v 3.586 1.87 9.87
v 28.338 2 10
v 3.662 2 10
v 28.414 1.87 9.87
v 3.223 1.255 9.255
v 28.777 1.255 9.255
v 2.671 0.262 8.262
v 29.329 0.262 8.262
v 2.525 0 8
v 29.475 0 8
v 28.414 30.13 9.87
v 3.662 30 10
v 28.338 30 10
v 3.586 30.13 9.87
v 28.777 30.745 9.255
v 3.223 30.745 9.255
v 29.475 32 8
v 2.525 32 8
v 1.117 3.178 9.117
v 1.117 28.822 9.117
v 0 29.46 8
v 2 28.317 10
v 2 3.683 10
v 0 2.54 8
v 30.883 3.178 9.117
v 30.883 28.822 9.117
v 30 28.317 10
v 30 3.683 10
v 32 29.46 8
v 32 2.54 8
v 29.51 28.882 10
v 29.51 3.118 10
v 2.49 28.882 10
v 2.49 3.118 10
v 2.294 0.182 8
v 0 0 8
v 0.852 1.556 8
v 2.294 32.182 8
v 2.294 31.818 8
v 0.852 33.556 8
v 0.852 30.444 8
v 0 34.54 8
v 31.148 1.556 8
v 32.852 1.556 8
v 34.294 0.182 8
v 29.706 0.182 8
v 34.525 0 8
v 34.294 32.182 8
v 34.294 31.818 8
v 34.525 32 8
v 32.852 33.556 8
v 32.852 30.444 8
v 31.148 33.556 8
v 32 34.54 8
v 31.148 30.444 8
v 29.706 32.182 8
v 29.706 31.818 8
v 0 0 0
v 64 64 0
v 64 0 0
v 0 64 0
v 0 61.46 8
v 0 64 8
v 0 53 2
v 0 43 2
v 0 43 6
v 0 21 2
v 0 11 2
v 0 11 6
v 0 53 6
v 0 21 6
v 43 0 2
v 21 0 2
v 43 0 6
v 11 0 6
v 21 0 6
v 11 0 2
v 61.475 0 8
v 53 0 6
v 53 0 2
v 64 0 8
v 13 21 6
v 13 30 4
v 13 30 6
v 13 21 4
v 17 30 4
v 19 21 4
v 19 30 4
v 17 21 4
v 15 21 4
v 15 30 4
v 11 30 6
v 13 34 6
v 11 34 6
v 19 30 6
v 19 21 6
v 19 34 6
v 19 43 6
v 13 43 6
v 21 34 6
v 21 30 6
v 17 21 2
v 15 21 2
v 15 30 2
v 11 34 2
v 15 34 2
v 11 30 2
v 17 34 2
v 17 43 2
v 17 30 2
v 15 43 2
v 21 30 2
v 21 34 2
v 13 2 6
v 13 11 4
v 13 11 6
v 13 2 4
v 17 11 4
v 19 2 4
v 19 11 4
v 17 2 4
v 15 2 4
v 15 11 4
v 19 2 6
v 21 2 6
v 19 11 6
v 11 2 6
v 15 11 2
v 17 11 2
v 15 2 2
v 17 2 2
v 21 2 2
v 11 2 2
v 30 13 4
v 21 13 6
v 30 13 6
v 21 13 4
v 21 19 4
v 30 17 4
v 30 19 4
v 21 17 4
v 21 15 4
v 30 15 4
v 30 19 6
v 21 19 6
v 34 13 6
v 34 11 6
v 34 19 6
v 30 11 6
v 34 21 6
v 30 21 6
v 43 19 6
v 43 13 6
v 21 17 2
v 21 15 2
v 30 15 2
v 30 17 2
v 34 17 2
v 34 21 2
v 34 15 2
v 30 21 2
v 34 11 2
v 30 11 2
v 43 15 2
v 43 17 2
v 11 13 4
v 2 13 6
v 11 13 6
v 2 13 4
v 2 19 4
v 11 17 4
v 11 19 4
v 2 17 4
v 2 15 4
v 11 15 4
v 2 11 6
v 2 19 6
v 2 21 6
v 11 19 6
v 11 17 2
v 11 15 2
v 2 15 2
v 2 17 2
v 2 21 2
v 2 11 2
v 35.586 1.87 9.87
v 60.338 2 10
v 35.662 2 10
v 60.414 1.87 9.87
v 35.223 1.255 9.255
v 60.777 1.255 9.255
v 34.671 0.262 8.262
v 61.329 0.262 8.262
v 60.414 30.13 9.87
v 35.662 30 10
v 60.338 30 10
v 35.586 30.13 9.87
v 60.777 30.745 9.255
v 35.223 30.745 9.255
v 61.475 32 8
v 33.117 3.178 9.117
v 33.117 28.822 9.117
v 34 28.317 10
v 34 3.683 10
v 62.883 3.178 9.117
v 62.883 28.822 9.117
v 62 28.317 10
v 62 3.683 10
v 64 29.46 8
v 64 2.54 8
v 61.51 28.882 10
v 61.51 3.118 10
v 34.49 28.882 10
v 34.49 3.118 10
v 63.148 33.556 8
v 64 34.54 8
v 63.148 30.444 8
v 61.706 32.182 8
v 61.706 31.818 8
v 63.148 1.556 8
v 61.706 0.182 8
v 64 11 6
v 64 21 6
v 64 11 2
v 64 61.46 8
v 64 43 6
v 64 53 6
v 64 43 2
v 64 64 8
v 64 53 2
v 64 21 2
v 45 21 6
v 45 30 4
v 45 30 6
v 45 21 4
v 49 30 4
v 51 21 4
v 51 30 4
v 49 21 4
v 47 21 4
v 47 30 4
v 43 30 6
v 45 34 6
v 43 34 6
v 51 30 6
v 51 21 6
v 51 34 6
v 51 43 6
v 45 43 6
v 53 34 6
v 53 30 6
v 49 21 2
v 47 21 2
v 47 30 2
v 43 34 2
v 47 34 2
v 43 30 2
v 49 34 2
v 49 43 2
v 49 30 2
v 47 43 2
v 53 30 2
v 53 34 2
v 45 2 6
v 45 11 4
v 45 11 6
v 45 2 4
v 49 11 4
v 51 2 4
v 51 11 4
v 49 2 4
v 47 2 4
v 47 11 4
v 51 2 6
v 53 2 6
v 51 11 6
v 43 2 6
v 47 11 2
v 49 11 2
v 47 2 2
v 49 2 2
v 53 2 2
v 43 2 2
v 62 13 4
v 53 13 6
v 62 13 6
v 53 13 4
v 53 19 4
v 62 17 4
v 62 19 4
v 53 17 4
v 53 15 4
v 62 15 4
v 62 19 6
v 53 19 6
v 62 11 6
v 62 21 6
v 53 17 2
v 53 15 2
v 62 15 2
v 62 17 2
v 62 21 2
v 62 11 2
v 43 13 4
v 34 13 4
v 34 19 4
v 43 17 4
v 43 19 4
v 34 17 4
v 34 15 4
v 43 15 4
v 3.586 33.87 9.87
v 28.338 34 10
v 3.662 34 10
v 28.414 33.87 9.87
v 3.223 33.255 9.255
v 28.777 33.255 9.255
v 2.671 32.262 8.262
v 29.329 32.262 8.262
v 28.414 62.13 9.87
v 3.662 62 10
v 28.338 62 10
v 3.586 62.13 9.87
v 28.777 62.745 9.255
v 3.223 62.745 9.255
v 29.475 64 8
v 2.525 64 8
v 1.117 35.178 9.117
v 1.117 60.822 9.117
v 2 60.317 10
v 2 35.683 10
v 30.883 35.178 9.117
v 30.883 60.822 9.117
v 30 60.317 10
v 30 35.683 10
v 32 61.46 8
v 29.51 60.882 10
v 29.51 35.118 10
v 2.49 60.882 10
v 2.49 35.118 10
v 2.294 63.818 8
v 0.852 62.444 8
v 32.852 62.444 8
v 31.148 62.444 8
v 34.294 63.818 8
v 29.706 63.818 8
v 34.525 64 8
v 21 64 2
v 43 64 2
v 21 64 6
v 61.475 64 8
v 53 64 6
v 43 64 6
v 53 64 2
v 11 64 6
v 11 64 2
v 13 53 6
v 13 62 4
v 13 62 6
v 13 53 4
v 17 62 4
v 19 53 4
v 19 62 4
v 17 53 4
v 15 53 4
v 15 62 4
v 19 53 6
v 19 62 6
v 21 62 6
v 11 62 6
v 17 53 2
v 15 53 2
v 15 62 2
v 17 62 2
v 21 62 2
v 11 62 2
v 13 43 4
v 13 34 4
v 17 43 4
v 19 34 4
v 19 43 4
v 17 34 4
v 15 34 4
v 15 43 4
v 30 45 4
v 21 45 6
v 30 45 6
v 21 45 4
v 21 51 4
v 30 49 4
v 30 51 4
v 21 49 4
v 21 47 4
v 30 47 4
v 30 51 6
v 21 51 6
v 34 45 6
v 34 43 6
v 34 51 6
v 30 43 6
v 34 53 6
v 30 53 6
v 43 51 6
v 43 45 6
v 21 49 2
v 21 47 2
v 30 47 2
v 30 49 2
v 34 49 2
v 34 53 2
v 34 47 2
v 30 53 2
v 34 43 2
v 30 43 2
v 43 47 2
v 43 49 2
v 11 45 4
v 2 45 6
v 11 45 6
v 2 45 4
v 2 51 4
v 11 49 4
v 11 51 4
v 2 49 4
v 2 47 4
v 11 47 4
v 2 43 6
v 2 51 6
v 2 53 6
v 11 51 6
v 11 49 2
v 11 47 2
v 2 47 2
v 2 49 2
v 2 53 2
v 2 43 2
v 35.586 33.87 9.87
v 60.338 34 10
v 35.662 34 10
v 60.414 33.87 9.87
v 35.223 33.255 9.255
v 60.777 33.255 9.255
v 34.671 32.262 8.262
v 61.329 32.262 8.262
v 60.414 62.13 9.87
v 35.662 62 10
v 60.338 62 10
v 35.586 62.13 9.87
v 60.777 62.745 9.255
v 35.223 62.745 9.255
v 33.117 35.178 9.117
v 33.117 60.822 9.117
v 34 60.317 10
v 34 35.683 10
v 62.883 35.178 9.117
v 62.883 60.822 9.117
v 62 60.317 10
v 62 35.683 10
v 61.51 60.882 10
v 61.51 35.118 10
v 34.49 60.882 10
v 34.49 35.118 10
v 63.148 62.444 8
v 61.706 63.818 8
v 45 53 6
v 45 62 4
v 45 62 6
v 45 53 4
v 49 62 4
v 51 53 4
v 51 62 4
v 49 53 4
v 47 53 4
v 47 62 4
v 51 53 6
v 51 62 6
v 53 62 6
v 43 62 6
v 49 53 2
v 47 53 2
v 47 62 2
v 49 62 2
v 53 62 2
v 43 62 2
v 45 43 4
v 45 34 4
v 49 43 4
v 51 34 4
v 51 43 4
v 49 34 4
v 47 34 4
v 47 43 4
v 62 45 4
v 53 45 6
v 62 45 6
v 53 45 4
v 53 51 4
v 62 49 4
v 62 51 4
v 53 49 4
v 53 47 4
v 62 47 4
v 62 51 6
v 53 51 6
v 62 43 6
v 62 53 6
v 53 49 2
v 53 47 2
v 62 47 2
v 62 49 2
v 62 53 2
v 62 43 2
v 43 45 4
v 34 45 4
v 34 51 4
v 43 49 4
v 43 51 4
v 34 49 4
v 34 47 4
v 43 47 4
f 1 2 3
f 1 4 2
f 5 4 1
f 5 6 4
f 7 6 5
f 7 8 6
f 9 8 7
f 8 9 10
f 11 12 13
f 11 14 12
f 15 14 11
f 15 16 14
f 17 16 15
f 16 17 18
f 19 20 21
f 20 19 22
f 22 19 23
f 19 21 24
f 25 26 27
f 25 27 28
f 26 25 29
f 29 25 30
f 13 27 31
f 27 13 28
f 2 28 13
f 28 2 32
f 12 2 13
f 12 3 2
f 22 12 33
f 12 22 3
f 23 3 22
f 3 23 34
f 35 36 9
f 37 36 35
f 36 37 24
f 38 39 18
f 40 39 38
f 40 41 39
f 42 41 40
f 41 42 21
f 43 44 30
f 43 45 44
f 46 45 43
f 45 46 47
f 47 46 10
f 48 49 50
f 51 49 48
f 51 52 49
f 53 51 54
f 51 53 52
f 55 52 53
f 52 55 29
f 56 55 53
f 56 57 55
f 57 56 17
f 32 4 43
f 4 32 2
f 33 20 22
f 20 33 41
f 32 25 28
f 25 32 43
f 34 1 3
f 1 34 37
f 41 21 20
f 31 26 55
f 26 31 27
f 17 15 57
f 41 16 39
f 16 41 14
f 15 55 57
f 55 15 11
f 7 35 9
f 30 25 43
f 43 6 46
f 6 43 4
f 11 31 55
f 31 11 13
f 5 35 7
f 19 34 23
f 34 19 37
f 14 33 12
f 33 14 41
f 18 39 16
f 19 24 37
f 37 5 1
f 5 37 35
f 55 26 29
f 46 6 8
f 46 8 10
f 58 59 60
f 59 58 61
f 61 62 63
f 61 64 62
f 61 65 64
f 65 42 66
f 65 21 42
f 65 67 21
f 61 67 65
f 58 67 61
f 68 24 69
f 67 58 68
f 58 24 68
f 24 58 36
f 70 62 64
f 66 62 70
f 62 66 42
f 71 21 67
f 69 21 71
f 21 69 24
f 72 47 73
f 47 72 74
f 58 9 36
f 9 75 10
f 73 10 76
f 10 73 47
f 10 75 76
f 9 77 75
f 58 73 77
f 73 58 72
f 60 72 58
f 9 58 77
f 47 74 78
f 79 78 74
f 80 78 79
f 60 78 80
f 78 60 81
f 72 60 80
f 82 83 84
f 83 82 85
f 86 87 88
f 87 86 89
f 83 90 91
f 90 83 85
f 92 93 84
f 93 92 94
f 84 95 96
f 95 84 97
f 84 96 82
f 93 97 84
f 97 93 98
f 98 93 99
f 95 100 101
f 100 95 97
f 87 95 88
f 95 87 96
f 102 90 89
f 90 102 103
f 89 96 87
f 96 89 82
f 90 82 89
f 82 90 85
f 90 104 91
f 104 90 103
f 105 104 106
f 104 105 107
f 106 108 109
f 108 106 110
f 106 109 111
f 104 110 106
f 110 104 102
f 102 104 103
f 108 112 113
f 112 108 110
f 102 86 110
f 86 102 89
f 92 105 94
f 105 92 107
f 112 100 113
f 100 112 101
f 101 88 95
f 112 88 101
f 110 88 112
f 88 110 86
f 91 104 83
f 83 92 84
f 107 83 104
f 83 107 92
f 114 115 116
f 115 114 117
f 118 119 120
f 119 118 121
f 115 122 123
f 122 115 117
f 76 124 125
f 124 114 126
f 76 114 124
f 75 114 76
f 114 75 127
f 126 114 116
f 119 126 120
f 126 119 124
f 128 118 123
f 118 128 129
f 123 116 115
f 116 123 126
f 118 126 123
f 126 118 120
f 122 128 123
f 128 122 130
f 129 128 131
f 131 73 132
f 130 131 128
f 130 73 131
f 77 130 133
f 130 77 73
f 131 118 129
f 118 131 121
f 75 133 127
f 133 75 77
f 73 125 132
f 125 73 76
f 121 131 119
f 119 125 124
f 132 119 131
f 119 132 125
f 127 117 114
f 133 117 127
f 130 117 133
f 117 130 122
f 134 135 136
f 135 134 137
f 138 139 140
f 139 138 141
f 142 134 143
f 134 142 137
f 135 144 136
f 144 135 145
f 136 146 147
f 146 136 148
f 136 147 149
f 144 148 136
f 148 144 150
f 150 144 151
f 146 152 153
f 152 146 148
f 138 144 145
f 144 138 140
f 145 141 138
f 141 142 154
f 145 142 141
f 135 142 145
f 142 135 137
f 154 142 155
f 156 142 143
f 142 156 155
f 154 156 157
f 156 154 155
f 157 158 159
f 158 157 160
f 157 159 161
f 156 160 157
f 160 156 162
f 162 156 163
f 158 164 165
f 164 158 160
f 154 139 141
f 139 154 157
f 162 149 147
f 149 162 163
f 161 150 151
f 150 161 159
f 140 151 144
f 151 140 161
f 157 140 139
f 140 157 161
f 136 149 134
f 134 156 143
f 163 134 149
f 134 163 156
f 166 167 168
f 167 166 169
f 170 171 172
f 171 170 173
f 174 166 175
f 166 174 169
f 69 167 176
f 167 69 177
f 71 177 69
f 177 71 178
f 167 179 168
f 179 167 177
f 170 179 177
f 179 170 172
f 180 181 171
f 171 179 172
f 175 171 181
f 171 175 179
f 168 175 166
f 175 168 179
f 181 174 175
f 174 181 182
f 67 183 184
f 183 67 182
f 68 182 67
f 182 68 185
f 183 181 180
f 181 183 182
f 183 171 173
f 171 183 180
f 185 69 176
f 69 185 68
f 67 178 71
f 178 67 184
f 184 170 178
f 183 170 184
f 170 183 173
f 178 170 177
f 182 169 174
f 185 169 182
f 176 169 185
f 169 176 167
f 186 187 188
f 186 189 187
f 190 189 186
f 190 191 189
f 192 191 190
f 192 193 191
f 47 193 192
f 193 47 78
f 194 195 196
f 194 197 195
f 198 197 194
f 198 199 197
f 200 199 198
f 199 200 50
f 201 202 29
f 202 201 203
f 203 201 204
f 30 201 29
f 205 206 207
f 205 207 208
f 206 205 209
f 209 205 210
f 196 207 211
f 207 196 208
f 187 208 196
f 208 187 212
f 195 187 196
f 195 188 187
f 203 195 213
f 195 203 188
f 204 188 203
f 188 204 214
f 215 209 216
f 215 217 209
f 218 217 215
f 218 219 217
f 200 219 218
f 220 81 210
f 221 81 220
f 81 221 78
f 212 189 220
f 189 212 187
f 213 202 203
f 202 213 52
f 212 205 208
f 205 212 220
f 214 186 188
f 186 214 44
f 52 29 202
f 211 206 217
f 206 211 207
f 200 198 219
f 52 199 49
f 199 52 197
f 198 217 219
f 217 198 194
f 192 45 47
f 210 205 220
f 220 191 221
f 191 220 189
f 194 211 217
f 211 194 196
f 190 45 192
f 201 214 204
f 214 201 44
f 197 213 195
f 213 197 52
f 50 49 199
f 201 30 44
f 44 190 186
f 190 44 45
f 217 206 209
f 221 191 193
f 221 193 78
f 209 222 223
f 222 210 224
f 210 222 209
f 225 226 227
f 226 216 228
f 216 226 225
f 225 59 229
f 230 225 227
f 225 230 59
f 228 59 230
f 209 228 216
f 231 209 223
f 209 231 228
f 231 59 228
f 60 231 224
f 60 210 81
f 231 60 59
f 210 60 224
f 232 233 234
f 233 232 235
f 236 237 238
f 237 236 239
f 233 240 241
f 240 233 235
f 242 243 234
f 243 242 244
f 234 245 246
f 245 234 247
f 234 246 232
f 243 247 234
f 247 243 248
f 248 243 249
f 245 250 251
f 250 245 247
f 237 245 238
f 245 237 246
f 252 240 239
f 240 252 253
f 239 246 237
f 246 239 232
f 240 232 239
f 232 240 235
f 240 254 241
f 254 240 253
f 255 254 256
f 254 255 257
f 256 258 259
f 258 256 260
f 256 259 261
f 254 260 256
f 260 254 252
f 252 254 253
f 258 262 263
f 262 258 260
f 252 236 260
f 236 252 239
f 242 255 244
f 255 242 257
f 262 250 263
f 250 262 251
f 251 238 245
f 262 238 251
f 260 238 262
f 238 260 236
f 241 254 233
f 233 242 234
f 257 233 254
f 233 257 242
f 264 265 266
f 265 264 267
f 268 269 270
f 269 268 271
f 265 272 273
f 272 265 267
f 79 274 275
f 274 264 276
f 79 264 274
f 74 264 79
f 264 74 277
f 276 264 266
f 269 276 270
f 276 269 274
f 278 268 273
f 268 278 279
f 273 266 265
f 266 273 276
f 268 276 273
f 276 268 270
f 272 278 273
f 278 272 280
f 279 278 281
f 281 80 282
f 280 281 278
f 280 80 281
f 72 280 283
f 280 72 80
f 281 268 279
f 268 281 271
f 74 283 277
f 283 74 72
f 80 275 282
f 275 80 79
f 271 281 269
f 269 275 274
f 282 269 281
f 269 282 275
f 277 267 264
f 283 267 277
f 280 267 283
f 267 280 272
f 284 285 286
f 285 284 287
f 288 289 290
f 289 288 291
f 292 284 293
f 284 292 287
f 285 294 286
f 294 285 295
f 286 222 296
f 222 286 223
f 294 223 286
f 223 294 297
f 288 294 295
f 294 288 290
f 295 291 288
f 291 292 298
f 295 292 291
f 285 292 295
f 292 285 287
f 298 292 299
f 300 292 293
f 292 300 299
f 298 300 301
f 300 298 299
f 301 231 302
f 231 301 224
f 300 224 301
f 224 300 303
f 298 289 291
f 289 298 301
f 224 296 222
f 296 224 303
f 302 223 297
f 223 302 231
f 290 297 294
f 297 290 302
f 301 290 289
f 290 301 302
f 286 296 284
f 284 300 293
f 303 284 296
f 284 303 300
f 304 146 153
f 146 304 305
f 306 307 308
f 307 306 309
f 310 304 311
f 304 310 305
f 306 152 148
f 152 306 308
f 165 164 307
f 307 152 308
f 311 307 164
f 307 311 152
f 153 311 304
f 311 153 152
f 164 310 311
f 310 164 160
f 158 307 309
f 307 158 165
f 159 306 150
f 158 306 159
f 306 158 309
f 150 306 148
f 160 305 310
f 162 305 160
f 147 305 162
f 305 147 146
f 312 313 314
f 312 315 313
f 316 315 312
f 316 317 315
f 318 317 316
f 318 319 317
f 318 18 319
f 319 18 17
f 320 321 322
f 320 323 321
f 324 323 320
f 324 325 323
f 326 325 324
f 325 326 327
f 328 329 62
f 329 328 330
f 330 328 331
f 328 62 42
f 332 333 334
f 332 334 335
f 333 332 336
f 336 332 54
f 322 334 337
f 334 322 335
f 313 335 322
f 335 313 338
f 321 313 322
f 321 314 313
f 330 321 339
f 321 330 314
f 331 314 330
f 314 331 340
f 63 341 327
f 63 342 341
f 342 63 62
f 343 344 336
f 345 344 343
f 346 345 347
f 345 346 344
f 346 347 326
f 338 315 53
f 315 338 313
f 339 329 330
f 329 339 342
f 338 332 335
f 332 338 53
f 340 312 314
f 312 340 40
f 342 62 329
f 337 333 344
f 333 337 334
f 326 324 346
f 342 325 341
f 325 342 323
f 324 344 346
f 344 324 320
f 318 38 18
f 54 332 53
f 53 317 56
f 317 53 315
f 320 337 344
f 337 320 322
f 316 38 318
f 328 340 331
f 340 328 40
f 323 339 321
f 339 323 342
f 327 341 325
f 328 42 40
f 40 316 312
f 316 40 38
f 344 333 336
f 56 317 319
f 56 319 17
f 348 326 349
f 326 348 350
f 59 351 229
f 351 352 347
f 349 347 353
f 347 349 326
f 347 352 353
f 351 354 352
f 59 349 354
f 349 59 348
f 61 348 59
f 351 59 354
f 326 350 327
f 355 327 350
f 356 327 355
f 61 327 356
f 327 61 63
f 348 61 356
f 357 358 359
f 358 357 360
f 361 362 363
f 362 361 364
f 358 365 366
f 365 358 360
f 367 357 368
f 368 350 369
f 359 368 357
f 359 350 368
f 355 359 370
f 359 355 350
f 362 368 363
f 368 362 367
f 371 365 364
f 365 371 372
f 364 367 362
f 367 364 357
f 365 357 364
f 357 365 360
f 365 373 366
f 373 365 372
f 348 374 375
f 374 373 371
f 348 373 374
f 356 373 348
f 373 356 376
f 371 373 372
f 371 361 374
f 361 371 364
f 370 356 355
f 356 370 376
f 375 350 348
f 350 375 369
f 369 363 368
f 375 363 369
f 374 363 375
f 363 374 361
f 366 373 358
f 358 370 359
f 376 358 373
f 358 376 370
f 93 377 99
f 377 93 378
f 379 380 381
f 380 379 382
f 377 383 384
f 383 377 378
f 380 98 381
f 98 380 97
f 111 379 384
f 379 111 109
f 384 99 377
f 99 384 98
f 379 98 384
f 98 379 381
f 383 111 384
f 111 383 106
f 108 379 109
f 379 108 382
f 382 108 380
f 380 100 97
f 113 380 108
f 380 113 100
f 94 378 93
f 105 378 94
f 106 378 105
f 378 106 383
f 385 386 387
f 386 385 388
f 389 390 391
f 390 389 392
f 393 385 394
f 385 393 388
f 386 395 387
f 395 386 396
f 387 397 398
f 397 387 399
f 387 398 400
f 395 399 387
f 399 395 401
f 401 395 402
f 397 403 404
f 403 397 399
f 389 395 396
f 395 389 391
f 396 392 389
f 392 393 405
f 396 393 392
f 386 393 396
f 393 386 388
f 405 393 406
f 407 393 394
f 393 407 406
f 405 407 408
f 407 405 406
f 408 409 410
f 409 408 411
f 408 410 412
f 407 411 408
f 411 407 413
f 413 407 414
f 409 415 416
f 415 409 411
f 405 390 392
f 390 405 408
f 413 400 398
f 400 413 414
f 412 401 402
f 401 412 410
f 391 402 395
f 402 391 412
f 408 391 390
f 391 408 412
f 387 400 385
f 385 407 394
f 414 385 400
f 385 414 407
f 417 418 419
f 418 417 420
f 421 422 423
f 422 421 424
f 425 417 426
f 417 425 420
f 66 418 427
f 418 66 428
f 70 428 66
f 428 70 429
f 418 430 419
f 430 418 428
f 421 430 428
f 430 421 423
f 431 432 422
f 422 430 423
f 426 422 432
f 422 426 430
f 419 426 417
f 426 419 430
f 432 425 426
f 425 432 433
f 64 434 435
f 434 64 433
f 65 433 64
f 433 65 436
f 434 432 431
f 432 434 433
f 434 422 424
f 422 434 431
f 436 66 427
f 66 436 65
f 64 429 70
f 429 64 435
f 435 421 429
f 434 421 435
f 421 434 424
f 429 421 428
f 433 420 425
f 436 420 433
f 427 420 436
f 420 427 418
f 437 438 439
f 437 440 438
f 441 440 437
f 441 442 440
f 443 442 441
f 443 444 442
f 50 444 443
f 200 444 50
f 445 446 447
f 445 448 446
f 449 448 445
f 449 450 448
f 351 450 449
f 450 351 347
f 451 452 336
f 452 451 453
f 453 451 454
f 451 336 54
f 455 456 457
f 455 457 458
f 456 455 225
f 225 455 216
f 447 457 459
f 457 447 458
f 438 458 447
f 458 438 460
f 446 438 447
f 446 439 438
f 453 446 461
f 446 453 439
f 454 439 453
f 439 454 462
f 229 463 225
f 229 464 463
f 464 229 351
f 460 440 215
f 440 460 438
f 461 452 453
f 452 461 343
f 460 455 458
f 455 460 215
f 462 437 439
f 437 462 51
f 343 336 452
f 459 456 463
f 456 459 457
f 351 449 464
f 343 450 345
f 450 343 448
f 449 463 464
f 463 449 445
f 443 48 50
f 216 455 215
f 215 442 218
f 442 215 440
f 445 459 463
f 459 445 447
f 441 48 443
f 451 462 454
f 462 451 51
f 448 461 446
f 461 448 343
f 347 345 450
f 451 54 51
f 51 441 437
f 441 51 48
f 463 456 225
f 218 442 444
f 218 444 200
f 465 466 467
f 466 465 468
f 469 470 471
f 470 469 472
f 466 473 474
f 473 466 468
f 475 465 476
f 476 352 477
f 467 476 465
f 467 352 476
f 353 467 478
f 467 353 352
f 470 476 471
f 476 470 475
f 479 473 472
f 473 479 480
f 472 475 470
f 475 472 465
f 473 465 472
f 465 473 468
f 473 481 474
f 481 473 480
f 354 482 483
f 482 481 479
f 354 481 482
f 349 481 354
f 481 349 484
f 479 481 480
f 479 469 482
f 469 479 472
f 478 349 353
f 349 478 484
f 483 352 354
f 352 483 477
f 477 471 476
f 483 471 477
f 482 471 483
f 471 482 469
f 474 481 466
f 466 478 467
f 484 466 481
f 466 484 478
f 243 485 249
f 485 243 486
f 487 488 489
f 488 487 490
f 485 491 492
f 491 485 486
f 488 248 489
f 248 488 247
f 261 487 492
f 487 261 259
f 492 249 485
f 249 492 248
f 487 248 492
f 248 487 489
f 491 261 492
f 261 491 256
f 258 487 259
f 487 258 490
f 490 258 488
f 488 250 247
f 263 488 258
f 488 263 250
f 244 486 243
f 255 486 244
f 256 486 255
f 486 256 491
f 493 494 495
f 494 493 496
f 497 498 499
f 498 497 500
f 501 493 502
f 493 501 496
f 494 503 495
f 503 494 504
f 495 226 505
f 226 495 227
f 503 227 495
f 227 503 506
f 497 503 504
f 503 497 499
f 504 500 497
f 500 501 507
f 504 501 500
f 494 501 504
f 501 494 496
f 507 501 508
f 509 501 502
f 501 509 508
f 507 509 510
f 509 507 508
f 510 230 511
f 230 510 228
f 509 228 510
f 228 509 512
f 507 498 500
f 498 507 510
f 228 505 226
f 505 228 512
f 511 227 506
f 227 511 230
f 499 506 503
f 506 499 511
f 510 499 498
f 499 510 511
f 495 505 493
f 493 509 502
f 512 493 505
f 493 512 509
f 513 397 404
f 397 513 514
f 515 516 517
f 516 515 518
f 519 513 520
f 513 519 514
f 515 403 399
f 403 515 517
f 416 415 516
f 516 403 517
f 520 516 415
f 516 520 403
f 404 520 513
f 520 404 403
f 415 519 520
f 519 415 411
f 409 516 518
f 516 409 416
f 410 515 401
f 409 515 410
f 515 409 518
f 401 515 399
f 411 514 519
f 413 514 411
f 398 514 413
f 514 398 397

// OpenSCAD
// file: ModularDungeonTileLibrary.scad
//Constants
wallleft = 0;
wallbottom = 1;
wallright = 2;
walltop = 3;
wallcenter = 4;
walldoubleright = 5;


//Variables
size = 32;
connectorlength = size-10;
connectorwidth = 6;
connectorheight = 4;
baseheight = 8;
topperheight = 2;
topperrounded = true;
walllength = size;
wallheight = 25;
wallwidth = 6;
wallwidththin = 4;


//Functions
function hypotenuse_ra(side_a, side_b) =
    sqrt(pow(side_a, 2) + pow(side_b, 2));
    
    
//Modules    
module mtdl_Base_Connector(cw,cl,ch) {
    translate([-connectorwidth/2,-connectorlength/2,-connectorheight/2]) {
        cube([cw,cl,ch/2]);
        translate([cw/3,0,ch/2])
            cube([cw/3,cl,ch/2]);
        translate([-(cw-2)/2,cl/2-2,0])
            cube([cw+4,4,ch]);
    }
}

module mdtl_Base(s,bh)
{
    cube([s,s,bh]);
}

module mdtl_Topper(s,bh,th,tr)
{
    if (tr) {
        translate([0,0,bh])
            intersection() {
                difference () {
                        cube([s,s,th]);
                        union () {
                        rotate(a=45, v=[1,0,0])
                            cube([s,th*2,th*2]);
                        translate([0,s,0])
                            rotate(a=45, v=[1,0,0])
                                cube([s,th*2,th*2]);
                        rotate(a=-45, v=[0,1,0])
                            cube([th*2,s,th*2]);
                        translate([s,0,0])
                            rotate(a=-45, v=[0,1,0])
                                cube([th*2,s,th*2]);
                        }
                }
                translate([s/2,s/2,0])
                    cylinder(
                        h=th, 
                        r1=hypotenuse_ra(s/2-1.2, s/2-1.2), 
                        r2=hypotenuse_ra(s/2-th-.8, s/2-th-.8), 
                        center=false, 
                        $fa=.1);
            }    
    }
    else {
        translate([0,0,bh])
            difference() {
                cube([s,s,th]);
                union () {
                rotate(a=45, v=[1,0,0])
                    cube([s,th*2,th*2]);
                translate([0,s,0])
                    rotate(a=45, v=[1,0,0])
                        cube([s,th*2,th*2]);
                rotate(a=-45, v=[0,1,0])
                    cube([th*2,s,th*2]);
                translate([s,0,0])
                    rotate(a=-45, v=[0,1,0])
                        cube([th*2,s,th*2]);
                }
            }    
    }
}

module mdtl_Base_1x1(s,bh,th,tr) 
{
    difference () {
        union () {
            mdtl_Base(s,bh);
            mdtl_Topper(s,bh,th,tr);
        }
        union () {
            translate([size/2,size,baseheight/2])
                rotate([0,180,0])
                    mtdl_Base_Connector(connectorwidth,connectorlength,connectorheight);
            translate([size/2,0,baseheight/2])
                rotate([0,180,0])
                    mtdl_Base_Connector(connectorwidth,connectorlength,connectorheight);
            translate([size,size/2,baseheight/2])
                rotate([0,180,90])
                    mtdl_Base_Connector(connectorwidth,connectorlength,connectorheight);
            translate([0,size/2,baseheight/2])
                rotate([0,180,90])
                    mtdl_Base_Connector(connectorwidth,connectorlength,connectorheight);
        }
    }
}

module mdtl_Base_1x2(s,bh,th,tr)
{
    union () {
        mdtl_Base_1x1(s,bh,th,tr);
        translate([s,0,0])
            mdtl_Base_1x1(s,bh,th,tr);
    }
}
 
module mdtl_Base_2x2(s,bh,th,tr)
{
    union () {
        mdtl_Base_1x2(s,bh,th,tr);
        translate([0,s,0])
            mdtl_Base_1x2(s,bh,th,tr);
    }
}
 
module mdtl_Base_2x4(s,bh,th,tr)
{
    union () {
        mdtl_Base_2x2(s,bh,th,tr);
        translate([s*2,0,0])
            mdtl_Base_2x2(s,bh,th,tr);
    }
}
 
module mdtl_Base_4x4(s,bh,th,tr)
{
    union () {
        mdtl_Base_2x4(s,bh,th,tr);
        translate([0,s*2,0])
            mdtl_Base_2x4(s,bh,th,tr);
    }
}
 
module mdtl_Wall_1(w,l,h)
{
    translate([0,0,baseheight])
        cube([w,l,h]);   
}

module mdtl_Wall_1_Position(w,l,h,p)
{
    if (p==0) {
        mdtl_Wall_1(w,l,h);
    }
    
    else if (p==1) {
        rotate(a=-90)
           translate([-w,0,0])
               mdtl_Wall_1(w,l,h);       
    }
    
    else if (p==2) {
        translate([(size)-w,0,0])
            mdtl_Wall_1(w,l,h);
    }
    
    else if (p==3) {
        rotate(a=-90)
            translate([-l,0,0])
                mdtl_Wall_1(w,l,h);
    }
    
    else if (p==4) {
        translate([(size)-w/2,0,0])
            mdtl_Wall_1(w,l,h);
    }
    
    else if (p==5) {
        translate([(size*2)-w,0,0])
           mdtl_Wall_1(w,l,h);       
    }
}

module mdtl_Wall_2(w,l,h)
{
    union() {
        mdtl_Wall_1(w,l,h);
        translate([0,l,0])
            mdtl_Wall_1(w,l,h);
    }
}

module mdtl_Wall_2_Position(w,l,h,p)
{
    if (p==0) {
        mdtl_Wall_2(w,l,h);
    }
    
    else if (p==1) {
        rotate(a=-90)
            translate([-w,0,0])
                mdtl_Wall_2(w,l,h);
    }
    
    else if (p==2) {
    translate([(size*2)-w,0,0])
        mdtl_Wall_2(w,l,h);
    }
    
    else if (p==3) {
        rotate(a=-90)
            translate([-l*2,0,0])
                mdtl_Wall_2(w,l,h);
    }
    
    else if (p==4) {
        translate([(size)-w/2,0,0])
            mdtl_Wall_2(w,l,h);
    }
}
// main file
include <ModularDungeonTileLibrary.scad>; 

mdtl_Base_2x2(size,baseheight,topperheight,topperrounded);
